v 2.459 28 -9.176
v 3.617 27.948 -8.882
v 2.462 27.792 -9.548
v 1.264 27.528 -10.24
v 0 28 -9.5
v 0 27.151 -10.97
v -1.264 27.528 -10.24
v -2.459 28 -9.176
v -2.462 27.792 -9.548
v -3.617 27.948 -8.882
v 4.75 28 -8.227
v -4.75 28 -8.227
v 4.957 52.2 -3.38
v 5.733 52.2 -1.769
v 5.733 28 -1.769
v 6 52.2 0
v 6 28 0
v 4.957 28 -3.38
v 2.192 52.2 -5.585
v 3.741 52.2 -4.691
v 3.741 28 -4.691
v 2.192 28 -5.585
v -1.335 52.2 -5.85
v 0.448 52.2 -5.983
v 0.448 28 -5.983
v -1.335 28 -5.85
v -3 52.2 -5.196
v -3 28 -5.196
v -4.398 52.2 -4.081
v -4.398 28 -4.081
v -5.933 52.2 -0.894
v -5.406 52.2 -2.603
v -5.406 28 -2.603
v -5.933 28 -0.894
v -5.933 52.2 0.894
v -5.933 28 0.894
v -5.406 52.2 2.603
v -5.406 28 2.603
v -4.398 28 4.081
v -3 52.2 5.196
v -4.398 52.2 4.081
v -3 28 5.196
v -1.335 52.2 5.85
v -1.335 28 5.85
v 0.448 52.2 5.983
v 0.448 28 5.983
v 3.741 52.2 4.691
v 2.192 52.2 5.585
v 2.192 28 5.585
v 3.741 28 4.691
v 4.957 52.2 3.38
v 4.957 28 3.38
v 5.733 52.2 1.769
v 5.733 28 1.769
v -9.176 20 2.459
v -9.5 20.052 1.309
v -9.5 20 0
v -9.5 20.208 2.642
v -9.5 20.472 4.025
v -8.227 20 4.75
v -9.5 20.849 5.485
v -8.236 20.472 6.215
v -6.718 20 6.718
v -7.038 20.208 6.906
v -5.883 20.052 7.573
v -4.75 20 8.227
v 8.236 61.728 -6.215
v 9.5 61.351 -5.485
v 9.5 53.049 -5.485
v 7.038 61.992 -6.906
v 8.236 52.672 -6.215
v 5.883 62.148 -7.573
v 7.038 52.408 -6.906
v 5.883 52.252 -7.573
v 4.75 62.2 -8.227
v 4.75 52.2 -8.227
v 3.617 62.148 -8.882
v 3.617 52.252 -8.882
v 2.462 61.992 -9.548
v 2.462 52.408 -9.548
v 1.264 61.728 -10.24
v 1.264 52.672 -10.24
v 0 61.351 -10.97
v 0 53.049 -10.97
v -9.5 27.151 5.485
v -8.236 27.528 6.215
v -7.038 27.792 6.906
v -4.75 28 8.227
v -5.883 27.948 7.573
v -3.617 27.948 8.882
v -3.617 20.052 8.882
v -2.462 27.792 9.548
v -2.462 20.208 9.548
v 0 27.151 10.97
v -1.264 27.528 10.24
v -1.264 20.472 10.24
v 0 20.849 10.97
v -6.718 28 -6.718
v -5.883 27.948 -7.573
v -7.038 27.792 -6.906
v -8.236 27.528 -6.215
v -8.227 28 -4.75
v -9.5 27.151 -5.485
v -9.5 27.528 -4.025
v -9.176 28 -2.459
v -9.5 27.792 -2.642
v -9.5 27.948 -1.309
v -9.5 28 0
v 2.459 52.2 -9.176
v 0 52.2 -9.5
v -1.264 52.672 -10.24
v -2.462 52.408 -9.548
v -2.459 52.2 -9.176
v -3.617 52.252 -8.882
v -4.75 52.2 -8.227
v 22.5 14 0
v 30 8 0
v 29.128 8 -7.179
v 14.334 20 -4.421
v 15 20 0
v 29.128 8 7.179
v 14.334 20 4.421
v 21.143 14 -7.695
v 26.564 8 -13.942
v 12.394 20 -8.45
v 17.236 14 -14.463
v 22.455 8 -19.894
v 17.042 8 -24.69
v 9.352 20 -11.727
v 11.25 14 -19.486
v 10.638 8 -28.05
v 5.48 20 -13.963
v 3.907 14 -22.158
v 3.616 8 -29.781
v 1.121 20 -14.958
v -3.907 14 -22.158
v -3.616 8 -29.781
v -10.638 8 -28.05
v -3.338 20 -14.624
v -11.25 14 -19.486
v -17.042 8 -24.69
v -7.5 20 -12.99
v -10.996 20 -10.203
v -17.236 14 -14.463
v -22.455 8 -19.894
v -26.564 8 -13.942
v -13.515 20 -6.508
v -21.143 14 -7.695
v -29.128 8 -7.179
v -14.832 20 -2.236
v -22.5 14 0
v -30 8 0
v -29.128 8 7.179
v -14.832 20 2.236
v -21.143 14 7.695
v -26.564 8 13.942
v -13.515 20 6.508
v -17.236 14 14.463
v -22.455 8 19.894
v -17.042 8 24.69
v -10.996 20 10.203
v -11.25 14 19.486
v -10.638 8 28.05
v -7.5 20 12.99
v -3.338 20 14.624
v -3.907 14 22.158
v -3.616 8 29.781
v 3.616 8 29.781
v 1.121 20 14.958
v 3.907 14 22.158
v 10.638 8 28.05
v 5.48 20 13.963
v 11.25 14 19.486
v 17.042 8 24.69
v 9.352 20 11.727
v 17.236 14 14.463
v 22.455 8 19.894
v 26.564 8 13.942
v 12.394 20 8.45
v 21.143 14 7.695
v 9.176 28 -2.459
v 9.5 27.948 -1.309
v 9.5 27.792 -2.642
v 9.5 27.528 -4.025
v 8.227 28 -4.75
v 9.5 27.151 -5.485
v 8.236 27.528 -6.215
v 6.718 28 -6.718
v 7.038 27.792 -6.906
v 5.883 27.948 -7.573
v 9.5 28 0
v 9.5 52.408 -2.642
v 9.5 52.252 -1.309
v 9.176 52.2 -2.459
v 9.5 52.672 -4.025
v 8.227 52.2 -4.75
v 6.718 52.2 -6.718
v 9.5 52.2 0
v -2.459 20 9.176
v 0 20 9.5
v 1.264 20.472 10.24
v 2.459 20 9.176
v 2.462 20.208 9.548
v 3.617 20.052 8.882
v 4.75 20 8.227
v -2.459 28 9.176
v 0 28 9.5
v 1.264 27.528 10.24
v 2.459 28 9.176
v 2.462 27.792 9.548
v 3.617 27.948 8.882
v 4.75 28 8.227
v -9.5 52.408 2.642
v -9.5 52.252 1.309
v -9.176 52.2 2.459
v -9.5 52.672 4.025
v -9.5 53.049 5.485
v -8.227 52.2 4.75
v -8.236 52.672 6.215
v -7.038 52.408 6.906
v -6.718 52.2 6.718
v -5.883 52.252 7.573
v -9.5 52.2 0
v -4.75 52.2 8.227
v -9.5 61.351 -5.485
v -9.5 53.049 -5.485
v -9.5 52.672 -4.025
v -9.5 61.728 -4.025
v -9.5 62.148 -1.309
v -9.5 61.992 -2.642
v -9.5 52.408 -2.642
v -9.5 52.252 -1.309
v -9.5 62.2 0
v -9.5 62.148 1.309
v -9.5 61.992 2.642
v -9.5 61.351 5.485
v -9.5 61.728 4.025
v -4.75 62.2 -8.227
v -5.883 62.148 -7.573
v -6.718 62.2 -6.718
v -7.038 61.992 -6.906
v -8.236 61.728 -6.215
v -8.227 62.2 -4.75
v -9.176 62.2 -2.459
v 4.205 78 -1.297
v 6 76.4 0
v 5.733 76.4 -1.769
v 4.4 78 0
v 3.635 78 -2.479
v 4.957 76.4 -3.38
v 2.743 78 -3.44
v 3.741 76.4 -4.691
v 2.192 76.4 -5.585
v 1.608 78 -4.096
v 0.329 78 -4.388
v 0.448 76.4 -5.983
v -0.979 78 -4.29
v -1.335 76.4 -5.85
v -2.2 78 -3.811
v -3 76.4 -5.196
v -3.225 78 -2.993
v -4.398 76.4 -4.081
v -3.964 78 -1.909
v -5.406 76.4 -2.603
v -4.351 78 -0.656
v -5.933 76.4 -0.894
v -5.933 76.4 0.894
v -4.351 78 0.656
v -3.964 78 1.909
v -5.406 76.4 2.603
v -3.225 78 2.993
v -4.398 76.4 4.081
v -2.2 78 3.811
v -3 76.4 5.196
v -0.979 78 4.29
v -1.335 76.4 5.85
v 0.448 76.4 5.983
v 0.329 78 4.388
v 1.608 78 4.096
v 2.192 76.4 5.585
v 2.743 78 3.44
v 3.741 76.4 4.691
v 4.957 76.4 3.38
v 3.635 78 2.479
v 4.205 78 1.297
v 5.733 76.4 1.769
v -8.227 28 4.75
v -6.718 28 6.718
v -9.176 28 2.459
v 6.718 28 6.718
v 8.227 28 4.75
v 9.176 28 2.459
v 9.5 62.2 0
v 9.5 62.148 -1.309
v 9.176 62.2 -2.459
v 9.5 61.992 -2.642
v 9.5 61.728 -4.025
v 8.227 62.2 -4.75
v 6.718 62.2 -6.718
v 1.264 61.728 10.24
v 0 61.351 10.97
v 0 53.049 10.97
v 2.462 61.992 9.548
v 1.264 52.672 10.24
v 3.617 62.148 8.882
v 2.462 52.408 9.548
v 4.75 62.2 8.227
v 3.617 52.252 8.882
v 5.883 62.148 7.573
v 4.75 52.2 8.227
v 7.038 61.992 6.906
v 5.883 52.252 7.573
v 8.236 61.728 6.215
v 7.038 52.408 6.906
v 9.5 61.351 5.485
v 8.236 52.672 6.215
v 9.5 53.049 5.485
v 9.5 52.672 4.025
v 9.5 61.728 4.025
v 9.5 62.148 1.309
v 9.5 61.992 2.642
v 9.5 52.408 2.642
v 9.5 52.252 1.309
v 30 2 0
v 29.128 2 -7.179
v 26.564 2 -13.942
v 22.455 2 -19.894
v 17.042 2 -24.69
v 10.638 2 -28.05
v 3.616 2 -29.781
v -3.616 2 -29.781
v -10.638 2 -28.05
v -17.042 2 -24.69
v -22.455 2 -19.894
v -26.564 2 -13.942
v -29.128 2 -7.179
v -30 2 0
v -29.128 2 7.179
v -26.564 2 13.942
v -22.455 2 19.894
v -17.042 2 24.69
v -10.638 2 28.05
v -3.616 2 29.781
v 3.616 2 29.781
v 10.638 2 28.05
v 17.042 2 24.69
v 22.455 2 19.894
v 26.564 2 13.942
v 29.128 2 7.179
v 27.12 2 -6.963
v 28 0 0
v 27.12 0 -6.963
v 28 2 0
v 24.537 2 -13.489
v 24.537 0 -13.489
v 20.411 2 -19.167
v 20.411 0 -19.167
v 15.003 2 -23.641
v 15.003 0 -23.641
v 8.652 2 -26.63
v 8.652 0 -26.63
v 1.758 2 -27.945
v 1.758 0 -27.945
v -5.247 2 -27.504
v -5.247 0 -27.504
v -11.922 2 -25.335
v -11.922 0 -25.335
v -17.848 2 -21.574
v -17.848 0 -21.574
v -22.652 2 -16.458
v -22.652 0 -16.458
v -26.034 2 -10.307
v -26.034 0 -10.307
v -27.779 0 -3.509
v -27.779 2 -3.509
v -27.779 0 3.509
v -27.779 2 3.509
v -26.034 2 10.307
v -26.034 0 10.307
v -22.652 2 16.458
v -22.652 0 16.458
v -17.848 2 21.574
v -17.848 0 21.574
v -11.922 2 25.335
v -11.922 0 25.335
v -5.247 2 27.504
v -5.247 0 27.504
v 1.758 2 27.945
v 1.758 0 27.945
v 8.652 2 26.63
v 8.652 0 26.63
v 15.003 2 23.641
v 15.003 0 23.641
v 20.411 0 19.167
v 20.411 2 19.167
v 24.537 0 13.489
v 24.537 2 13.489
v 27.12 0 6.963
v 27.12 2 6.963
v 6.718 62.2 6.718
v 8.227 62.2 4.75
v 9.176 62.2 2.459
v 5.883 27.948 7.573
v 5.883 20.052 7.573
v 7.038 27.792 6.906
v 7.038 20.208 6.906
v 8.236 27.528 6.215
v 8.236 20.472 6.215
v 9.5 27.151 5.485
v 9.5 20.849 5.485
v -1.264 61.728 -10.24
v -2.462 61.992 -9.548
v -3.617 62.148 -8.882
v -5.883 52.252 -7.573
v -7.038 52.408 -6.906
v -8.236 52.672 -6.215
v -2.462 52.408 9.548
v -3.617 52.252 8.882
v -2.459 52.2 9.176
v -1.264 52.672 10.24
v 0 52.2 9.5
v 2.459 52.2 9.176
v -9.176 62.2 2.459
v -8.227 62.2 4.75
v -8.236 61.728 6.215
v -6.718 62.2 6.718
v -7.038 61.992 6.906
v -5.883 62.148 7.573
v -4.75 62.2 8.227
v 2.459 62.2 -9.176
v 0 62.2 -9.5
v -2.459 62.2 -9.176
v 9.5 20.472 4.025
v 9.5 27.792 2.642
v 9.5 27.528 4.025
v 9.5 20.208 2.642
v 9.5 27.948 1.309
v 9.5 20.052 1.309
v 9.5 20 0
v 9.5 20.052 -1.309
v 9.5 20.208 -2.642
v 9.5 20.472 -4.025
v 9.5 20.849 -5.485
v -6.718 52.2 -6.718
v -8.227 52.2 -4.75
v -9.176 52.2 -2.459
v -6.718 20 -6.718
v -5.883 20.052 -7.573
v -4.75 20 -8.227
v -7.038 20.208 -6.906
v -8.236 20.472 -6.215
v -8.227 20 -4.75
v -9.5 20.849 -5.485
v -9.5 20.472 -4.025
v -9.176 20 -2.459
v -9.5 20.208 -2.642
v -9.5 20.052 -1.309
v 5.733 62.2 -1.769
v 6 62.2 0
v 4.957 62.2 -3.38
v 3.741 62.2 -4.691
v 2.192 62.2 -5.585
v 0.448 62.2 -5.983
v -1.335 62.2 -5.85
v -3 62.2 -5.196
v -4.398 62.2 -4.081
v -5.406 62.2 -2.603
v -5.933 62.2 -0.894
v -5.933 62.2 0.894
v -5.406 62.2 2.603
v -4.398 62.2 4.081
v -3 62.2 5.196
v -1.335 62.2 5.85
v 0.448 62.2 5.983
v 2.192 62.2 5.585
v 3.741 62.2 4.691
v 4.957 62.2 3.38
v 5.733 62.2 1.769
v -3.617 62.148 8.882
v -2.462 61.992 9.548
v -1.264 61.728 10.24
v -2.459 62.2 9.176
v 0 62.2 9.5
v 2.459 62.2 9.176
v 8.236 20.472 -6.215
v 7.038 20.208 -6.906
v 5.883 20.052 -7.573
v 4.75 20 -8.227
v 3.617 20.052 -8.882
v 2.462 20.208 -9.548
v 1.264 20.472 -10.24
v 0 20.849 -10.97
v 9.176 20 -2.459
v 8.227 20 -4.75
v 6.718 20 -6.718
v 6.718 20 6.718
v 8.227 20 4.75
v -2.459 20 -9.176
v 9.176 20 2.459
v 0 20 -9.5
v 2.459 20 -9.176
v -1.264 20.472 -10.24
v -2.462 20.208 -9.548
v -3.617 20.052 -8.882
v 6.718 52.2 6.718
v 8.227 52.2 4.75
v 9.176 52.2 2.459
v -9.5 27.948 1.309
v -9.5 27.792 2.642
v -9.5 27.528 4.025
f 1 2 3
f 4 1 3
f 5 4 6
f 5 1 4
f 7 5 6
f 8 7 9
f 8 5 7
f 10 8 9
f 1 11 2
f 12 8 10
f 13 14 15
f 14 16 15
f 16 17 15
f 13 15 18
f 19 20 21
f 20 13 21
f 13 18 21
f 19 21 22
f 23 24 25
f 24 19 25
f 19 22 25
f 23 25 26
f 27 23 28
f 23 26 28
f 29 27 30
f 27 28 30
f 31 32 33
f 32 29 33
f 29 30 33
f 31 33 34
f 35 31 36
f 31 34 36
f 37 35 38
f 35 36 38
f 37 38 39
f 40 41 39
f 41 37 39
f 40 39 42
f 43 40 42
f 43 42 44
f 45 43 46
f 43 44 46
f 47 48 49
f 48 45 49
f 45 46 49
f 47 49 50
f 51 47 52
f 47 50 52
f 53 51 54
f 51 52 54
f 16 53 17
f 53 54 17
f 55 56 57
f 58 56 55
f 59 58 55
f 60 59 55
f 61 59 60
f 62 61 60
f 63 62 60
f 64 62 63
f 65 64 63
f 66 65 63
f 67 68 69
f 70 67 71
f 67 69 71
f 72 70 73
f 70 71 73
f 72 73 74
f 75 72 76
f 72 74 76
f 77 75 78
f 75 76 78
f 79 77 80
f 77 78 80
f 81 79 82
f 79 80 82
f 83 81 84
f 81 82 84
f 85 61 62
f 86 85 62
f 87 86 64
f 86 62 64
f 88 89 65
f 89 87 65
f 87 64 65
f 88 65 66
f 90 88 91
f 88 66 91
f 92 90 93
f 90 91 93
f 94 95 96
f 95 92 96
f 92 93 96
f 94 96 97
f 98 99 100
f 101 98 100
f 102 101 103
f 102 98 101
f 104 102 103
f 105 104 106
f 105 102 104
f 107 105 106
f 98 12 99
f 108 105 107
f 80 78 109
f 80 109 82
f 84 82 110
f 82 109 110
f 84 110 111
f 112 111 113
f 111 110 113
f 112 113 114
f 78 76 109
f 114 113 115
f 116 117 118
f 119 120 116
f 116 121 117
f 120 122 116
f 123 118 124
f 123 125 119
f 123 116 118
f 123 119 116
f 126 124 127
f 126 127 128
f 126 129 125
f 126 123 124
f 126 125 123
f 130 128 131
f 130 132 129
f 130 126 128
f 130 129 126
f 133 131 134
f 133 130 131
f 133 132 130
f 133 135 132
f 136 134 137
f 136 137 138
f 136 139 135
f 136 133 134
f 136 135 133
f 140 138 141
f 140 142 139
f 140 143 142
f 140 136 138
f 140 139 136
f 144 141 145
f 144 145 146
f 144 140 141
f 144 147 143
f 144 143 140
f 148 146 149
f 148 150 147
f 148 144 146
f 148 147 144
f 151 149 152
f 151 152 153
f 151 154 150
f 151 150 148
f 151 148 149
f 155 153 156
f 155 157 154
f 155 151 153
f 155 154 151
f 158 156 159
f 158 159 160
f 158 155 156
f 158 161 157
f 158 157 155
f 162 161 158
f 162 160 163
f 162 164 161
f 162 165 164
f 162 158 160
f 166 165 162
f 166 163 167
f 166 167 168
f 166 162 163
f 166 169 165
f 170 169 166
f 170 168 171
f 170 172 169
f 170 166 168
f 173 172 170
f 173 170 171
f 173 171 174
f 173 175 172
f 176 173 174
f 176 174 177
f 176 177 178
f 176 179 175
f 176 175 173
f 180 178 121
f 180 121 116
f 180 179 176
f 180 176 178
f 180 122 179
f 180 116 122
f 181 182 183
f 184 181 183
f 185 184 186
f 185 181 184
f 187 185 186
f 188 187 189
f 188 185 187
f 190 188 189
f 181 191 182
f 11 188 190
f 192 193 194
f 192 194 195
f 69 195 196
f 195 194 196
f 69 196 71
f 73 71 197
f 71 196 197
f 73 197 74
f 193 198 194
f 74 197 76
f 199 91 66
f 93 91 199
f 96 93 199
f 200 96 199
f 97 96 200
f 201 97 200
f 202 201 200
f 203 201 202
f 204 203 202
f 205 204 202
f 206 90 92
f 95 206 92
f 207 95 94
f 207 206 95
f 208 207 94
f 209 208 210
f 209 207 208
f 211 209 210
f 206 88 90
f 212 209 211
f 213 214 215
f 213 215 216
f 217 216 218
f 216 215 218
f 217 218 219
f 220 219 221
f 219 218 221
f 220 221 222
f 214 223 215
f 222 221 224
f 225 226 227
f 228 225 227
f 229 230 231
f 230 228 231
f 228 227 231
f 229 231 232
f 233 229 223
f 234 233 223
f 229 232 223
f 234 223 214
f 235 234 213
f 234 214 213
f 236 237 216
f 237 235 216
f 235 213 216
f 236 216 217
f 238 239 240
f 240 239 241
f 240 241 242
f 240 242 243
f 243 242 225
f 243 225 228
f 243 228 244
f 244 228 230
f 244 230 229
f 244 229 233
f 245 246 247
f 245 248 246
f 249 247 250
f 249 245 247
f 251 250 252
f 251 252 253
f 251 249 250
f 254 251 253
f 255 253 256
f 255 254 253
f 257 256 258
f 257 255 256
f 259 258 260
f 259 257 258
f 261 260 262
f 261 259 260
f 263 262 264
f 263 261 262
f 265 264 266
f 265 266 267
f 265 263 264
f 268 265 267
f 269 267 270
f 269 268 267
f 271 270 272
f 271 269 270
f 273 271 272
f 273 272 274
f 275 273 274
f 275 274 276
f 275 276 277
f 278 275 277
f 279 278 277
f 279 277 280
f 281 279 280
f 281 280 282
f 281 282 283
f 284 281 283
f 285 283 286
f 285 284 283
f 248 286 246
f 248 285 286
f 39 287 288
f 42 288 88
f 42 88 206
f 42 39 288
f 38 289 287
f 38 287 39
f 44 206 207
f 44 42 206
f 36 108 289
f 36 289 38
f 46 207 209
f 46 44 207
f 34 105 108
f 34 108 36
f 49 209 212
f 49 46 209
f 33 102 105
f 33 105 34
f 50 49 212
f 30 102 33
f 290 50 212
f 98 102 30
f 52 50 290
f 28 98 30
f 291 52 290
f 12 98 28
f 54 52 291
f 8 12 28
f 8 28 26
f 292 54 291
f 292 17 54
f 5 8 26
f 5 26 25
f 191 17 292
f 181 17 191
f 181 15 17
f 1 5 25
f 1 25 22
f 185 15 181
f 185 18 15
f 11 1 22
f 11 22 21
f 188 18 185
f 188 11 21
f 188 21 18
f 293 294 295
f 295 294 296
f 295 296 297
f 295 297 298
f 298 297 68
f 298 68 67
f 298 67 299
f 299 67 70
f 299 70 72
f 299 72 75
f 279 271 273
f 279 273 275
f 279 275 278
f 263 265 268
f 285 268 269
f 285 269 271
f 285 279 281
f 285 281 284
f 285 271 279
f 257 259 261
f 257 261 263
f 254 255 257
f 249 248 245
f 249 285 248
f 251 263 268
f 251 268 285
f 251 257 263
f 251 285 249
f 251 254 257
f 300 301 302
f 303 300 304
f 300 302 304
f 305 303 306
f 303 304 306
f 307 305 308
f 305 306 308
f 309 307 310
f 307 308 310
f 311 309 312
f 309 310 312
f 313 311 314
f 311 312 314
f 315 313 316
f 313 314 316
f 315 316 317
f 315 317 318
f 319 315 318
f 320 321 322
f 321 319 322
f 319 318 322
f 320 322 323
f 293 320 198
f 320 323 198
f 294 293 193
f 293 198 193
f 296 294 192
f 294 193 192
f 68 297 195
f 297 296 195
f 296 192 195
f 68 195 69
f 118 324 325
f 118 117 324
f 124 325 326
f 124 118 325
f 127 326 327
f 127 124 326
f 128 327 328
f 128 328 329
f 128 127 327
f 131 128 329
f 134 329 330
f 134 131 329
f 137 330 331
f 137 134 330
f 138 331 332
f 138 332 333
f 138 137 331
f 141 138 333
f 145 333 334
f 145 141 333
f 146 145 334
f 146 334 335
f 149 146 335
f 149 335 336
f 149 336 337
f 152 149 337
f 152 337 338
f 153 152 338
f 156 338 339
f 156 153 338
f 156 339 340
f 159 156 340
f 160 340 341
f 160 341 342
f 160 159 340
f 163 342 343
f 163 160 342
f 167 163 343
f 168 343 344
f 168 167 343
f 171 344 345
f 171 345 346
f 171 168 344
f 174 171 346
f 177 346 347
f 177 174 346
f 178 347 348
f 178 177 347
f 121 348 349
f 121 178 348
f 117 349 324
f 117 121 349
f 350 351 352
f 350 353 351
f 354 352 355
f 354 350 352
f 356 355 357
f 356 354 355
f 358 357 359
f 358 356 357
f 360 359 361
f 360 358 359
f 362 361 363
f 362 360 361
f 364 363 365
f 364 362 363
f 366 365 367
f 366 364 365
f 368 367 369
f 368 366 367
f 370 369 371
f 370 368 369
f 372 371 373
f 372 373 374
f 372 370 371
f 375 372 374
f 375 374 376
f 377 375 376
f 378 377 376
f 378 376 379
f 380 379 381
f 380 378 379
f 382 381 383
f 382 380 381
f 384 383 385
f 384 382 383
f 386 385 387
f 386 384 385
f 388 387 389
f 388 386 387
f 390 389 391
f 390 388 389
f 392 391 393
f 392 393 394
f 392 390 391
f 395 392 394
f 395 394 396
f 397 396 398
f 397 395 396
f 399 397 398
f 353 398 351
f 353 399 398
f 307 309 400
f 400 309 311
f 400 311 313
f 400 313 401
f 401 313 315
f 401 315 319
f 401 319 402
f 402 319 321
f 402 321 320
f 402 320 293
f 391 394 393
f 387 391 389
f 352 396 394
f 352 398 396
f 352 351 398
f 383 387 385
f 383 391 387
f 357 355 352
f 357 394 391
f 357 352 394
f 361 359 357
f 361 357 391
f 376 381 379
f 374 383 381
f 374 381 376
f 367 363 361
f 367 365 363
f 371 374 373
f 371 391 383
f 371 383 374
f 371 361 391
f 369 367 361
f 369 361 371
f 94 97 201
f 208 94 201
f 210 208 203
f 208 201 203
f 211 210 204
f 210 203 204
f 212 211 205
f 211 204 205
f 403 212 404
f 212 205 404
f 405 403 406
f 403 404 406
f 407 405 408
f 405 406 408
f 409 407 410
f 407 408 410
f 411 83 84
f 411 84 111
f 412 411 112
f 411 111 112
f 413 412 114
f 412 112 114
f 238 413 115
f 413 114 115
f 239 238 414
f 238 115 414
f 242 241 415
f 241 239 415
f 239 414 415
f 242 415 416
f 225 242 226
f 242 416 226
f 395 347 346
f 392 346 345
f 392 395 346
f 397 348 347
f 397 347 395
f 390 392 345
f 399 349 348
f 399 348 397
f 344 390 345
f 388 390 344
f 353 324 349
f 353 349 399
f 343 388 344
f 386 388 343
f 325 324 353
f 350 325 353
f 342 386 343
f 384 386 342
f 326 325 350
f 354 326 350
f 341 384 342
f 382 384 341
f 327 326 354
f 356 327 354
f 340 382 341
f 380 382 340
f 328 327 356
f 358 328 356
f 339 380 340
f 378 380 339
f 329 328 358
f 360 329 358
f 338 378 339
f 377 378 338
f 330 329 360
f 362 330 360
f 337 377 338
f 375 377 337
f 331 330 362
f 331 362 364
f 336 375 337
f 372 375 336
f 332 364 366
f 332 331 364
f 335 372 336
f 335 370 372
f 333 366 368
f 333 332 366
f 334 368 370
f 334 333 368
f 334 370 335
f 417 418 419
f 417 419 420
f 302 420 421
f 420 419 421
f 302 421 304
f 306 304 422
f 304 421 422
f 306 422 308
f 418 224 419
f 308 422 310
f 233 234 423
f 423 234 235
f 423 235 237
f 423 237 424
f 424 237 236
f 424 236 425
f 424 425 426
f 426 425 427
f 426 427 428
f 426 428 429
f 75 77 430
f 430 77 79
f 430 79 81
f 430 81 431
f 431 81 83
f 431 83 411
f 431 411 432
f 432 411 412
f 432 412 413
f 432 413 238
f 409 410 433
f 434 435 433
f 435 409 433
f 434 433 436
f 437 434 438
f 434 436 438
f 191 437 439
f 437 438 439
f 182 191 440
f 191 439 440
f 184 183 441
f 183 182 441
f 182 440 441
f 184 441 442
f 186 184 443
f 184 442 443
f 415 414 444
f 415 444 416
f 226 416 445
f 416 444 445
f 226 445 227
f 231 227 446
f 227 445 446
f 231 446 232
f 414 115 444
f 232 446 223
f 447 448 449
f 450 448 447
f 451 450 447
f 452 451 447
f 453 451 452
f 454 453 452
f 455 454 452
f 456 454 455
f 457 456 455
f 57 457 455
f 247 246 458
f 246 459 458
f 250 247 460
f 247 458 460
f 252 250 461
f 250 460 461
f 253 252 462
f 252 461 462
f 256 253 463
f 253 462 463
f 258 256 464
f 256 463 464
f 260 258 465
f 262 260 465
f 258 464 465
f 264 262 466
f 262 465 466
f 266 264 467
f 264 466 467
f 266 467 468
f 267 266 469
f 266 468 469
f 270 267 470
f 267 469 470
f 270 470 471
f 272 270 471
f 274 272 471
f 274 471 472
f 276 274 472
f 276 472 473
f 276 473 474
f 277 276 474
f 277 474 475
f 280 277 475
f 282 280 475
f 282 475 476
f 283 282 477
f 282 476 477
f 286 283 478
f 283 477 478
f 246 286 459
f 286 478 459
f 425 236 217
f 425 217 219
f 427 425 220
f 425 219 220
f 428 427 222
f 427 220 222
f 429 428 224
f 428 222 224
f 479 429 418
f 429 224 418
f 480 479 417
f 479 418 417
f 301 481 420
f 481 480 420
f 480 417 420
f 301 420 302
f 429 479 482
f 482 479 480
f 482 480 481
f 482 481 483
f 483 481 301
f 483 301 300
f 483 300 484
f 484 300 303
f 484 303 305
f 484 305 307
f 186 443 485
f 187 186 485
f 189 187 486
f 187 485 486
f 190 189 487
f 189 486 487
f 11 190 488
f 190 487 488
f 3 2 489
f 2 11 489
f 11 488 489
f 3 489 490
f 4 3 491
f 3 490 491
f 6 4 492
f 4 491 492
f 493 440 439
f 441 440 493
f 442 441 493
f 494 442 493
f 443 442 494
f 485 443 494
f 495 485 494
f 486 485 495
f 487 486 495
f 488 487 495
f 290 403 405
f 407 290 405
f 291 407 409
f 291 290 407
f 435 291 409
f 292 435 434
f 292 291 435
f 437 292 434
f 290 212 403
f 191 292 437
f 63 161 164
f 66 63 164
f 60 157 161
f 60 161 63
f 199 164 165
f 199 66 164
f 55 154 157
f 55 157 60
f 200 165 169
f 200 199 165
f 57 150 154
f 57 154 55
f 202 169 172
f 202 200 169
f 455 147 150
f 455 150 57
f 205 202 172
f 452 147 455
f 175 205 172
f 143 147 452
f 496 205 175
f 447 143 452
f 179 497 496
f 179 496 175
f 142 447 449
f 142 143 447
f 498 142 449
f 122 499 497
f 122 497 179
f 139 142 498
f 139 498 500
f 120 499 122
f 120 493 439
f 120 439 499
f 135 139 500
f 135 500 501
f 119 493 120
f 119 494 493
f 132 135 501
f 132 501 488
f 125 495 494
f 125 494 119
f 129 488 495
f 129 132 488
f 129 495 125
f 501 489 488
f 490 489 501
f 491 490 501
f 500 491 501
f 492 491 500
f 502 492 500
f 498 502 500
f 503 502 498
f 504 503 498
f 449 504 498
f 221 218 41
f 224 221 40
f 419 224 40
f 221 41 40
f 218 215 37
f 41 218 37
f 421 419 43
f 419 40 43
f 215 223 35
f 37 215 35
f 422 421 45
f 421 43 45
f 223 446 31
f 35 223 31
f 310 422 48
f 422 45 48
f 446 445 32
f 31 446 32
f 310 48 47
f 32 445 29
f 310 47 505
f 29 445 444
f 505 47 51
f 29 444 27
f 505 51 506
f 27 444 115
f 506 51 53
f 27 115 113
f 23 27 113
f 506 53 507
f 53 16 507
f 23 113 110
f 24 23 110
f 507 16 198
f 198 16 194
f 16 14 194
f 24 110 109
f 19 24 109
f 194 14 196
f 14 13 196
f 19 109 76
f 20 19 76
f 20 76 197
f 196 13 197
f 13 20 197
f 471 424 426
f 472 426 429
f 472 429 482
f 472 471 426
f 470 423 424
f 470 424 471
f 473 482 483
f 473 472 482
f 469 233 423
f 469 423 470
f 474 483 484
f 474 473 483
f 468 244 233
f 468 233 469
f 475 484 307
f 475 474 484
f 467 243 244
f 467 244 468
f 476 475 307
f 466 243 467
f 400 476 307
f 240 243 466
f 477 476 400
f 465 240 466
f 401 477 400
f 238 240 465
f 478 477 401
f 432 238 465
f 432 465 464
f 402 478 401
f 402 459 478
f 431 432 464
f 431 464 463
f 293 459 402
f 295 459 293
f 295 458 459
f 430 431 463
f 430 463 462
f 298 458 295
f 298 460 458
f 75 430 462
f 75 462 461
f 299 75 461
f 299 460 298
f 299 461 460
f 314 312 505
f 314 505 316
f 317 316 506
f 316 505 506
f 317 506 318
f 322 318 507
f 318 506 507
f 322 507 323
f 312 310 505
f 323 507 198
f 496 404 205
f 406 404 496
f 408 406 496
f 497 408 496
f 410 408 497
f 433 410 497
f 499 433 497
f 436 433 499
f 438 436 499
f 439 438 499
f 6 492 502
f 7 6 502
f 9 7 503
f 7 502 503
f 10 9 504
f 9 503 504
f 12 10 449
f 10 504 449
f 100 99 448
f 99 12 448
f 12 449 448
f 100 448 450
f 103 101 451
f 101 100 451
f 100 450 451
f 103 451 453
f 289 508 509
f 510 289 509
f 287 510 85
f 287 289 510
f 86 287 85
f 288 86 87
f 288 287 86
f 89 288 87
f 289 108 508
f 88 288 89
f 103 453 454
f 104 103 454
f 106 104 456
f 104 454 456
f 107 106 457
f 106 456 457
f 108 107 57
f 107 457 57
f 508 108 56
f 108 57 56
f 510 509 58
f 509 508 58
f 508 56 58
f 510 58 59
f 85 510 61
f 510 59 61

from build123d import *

# Parameters (mm, degrees)
EXTRUDE_1_DEPTH = 8
EXTRUDE_2_DEPTH = 10


with BuildPart() as part:
    # Эскиз1 → Повернуть1 (revolve)
    with BuildSketch(Plane.XY, mode=Mode.PRIVATE) as revolve_1_sk:
        Polygon((0, 0), (-28, 0), (-28, 2), (-30, 2), (-30, 8), (-15, 20), (-6, 20), (-6, 28), (-6, 76.4), (-4.4, 78), (0, 78), align=None)
    revolve(revolve_1_sk.sketch.rotate(Axis((0, 0, 0), (0, 1, 0)), 180), axis=Axis((0, 0, 0), (0, 1, 0)))  # turned: the seam where the file's is

    # Эскиз2 → Бобышка-Вытянуть1 (add)
    with BuildSketch(Plane(origin=(0, 20, 0), x_dir=(1, 0, 0), z_dir=(0, 1, 0))):
        Polygon((0, 10.969655115), (-9.5, 5.484827557), (-9.5, -5.484827557), (0, -10.969655115), (9.5, -5.484827557), (9.5, 5.484827557), align=None)
    extrude(amount=EXTRUDE_1_DEPTH)

    # Эскиз3 → Бобышка-Вытянуть2 (add)
    with BuildSketch(Plane(origin=(0, 52.2, 0), x_dir=(1, 0, 0), z_dir=(0, 1, 0))):
        Polygon((9.5, 5.484827557), (0, 10.969655115), (-9.5, 5.484827557), (-9.5, -5.484827557), (0, -10.969655115), (9.5, -5.484827557), align=None)
    extrude(amount=EXTRUDE_2_DEPTH)

    # Эскиз4 → Вырез-Повернуть2 (revolve, cut)
    with BuildSketch(Plane.XY, mode=Mode.PRIVATE) as cut_revolve_2_sk:
        Polygon((-18.160254038, 62.2), (-9.5, 62.2), (-18.160254038, 57.2), align=None)
        Polygon((-18.160254038, 52.2), (-18.160254038, 57.2), (-9.5, 52.2), align=None)
        Polygon((-16.42820323, 28), (-16.42820323, 24), (-9.5, 28), align=None)
        Polygon((-16.42820323, 24), (-16.42820323, 20), (-9.5, 20), align=None)
    revolve(cut_revolve_2_sk.sketch.rotate(Axis((0, 78, 0), (0, 1, 0)), 180), axis=Axis((0, 78, 0), (0, 1, 0)), mode=Mode.SUBTRACT)  # turned: the seam where the file's is


solid = part.part
